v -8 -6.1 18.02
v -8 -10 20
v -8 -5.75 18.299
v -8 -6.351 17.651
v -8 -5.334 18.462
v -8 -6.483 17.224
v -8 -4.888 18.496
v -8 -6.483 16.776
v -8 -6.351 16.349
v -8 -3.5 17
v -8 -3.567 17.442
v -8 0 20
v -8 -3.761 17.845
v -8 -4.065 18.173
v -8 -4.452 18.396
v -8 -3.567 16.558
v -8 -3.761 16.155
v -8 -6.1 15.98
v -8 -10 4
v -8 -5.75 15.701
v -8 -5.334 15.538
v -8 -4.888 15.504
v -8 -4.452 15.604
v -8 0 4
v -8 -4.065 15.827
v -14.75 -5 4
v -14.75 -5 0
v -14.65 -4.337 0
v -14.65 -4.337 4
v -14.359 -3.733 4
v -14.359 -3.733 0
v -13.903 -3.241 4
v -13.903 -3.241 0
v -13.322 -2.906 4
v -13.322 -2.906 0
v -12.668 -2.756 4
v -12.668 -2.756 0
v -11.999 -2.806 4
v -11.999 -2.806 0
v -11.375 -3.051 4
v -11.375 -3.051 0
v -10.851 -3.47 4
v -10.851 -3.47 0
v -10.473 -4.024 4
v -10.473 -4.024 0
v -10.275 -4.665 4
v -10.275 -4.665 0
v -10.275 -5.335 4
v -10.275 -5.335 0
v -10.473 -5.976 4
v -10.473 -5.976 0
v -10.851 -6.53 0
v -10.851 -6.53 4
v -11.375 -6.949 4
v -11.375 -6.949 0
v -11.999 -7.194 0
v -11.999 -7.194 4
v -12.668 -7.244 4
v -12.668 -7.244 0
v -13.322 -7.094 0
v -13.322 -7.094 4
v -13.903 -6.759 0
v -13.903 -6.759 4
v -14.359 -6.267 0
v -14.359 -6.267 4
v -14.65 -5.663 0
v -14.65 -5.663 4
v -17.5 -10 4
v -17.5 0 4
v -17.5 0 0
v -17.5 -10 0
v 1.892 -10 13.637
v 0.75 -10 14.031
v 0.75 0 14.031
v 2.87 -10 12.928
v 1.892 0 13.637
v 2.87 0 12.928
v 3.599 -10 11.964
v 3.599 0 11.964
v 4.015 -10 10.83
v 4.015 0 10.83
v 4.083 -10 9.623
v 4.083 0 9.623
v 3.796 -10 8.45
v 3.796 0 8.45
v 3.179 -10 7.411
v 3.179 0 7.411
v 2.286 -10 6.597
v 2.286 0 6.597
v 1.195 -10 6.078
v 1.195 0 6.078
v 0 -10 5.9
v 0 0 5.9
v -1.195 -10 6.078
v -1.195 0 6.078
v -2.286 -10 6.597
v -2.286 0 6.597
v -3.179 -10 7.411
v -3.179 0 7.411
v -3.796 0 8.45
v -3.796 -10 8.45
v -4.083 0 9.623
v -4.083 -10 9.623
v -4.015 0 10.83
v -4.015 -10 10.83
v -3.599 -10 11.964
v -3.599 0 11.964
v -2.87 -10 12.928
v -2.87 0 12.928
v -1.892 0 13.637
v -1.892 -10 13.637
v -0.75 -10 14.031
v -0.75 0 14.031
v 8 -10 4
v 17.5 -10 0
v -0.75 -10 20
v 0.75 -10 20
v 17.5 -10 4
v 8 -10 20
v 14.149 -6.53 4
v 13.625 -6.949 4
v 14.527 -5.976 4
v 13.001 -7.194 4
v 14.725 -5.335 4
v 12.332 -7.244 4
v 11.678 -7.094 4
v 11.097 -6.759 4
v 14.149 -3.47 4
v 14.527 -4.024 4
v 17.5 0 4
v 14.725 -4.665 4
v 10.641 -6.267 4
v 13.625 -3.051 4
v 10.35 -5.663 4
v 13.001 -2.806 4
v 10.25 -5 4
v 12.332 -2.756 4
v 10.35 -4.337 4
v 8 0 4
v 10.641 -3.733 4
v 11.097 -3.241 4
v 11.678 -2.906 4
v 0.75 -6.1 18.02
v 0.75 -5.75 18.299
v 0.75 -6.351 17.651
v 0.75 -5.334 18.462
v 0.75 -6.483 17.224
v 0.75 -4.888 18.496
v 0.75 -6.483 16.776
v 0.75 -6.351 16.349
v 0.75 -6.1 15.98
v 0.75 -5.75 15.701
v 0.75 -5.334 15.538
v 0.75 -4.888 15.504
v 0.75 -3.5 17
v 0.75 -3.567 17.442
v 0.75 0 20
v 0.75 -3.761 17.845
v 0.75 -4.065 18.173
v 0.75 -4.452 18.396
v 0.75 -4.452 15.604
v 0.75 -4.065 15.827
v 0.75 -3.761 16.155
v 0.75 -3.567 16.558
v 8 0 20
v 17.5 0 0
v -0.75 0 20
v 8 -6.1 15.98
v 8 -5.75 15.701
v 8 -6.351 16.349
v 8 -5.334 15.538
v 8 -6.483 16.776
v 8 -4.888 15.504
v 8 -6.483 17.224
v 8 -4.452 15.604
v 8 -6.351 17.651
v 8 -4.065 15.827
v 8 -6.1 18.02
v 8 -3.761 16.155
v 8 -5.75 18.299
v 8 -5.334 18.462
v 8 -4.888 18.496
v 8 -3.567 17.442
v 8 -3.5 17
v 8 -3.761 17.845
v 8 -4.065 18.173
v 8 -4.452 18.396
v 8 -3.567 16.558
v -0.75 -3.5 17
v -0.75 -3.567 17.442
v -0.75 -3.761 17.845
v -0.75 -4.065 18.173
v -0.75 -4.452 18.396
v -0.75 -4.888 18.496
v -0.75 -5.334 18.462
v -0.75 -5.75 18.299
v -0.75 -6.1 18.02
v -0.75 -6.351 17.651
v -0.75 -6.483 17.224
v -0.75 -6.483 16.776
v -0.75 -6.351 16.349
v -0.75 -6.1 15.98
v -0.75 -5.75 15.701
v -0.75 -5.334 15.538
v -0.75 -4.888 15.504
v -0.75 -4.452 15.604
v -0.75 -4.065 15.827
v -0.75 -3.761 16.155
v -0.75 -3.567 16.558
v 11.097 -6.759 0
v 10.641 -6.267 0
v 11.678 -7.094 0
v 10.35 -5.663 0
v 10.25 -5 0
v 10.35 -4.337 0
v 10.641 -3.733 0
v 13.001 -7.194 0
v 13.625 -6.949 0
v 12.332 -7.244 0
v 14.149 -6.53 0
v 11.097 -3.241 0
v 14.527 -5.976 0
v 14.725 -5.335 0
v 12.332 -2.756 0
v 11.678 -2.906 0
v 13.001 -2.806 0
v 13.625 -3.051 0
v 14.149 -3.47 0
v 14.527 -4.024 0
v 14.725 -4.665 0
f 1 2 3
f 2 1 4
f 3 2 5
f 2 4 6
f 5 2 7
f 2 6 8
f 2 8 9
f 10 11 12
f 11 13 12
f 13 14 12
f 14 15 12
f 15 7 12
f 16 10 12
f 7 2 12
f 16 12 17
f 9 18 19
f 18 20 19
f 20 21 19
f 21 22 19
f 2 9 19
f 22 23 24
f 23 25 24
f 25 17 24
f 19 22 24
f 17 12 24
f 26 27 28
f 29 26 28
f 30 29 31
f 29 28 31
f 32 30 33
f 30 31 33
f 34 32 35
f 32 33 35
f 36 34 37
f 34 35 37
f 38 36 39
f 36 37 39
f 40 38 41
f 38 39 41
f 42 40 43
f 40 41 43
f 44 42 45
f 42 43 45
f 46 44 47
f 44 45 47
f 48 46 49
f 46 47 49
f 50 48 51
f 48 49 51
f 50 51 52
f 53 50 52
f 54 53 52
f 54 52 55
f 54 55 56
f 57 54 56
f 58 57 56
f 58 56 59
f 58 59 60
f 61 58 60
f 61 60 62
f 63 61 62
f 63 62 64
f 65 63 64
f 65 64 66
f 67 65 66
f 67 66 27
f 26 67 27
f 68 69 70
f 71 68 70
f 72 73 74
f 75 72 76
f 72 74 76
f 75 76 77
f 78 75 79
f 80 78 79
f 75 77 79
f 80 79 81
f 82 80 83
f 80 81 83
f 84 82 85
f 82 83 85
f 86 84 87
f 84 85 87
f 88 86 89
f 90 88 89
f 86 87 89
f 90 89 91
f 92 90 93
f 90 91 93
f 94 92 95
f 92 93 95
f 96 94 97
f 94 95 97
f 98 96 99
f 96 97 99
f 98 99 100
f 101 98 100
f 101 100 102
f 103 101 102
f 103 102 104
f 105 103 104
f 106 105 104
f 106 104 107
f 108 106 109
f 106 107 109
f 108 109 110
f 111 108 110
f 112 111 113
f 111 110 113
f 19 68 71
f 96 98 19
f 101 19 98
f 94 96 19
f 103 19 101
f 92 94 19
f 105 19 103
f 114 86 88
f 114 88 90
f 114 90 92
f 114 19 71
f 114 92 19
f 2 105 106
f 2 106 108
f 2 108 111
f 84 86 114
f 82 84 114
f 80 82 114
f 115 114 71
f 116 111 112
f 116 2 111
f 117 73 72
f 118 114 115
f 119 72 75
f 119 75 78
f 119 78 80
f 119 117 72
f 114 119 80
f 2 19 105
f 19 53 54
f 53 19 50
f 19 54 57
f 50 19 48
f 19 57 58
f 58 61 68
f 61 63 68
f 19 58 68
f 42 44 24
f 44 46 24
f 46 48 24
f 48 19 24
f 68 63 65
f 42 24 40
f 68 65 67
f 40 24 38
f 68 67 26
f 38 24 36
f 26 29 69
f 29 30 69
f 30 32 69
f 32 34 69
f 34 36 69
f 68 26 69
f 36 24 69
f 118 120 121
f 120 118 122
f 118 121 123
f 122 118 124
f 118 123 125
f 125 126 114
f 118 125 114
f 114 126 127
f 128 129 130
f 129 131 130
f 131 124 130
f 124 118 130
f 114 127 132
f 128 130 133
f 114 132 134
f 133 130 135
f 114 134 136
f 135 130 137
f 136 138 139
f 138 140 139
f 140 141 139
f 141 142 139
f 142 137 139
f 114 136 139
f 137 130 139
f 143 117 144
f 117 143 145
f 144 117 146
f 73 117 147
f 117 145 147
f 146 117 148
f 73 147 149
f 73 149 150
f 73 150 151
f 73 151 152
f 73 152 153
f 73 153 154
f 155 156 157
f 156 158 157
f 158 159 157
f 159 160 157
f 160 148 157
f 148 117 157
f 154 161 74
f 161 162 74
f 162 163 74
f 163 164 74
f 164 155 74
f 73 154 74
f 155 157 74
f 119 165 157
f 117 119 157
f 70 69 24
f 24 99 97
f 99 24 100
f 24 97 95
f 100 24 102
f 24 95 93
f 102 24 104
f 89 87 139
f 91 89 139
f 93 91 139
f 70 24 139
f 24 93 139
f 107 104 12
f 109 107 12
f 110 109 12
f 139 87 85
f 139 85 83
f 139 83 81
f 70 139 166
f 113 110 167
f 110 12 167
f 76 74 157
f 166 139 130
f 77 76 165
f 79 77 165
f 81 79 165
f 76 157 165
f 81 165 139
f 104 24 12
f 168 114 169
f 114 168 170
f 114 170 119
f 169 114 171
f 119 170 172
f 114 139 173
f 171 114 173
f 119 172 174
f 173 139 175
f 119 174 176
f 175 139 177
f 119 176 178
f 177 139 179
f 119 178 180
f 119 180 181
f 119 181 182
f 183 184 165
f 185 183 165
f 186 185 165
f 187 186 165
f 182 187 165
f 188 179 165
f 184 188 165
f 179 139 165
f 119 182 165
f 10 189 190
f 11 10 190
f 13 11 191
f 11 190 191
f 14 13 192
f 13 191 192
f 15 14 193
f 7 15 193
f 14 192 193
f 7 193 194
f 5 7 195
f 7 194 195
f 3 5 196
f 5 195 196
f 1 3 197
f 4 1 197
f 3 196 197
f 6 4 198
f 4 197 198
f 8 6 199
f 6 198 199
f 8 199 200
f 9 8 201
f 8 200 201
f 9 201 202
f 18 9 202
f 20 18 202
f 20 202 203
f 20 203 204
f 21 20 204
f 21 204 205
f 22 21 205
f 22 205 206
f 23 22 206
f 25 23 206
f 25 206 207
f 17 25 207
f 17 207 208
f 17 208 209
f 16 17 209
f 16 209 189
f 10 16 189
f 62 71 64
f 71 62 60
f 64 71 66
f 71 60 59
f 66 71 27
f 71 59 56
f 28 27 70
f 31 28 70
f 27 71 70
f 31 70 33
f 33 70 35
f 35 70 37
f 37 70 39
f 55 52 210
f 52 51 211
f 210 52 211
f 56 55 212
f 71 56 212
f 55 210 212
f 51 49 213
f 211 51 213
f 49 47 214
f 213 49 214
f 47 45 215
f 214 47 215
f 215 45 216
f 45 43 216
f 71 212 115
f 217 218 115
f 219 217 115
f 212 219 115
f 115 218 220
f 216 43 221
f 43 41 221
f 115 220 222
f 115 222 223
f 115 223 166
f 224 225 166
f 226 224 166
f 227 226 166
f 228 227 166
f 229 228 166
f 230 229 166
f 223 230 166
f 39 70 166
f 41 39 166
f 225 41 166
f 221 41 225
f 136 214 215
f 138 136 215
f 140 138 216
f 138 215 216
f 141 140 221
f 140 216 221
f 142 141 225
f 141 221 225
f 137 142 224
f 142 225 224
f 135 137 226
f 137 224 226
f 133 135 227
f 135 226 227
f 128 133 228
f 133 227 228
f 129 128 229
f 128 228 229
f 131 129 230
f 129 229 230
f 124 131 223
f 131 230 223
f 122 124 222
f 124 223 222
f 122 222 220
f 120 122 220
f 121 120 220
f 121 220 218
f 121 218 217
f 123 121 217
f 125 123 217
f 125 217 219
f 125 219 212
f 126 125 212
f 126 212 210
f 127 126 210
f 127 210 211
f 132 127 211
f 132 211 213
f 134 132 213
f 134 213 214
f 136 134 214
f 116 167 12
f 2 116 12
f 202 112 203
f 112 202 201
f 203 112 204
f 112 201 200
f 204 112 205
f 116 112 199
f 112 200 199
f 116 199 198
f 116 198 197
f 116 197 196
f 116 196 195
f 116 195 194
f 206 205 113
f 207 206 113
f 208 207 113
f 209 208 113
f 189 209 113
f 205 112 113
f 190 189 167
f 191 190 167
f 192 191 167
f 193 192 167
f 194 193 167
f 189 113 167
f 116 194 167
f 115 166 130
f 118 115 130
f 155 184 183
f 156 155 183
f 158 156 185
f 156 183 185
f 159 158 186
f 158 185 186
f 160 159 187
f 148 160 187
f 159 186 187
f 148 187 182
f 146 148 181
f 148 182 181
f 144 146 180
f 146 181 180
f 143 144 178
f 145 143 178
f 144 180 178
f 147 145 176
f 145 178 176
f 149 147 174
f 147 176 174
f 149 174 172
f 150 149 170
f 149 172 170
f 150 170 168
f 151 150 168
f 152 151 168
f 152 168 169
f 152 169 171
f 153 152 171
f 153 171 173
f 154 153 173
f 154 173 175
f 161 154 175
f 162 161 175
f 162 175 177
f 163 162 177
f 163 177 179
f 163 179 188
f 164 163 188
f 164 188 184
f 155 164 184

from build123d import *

# Parameters (mm, degrees)
F1_DEPTH = 10
F3_D     = 4.5
F5_D     = 3


with BuildPart() as f1:
    # F0 (on Front) → F1 (new body)
    with BuildSketch(Plane.XZ):
        with BuildLine():
            Line((-17.5, 0), (-8, 0))
            Line((-8, 0), (8, 0))
            Line((8, 0), (17.5, 0))
            Line((17.5, 0), (17.5, 4))
            Line((17.5, 4), (8, 4))
            Line((8, 4), (8, 20))
            Line((8, 20), (0.75, 20))
            Line((0.75, 20), (0.75, 14.030819))
            ThreePointArc((0.75, 14.030819), (0, 5.9), (-0.75, 14.030819))
            Line((-0.75, 14.030819), (-0.75, 20))
            Line((-0.75, 20), (-8, 20))
            Line((-8, 20), (-8, 4))
            Line((-8, 4), (-17.5, 4))
            Line((-17.5, 4), (-17.5, 0))
        make_face()
    extrude(amount=F1_DEPTH)

    # F3 (through all)
    with Locations(Plane.XY.offset(4)):
        with Locations((-12.5, -5), (12.5, -5)):
            Hole(F3_D / 2)

    # F5 (through all)
    with Locations(Plane(origin=(-8, 0, 0), x_dir=(0, -1, 0), z_dir=(-1, 0, 0))):
        with Locations((5, 17)):
            Hole(F5_D / 2)


solid = f1.part
